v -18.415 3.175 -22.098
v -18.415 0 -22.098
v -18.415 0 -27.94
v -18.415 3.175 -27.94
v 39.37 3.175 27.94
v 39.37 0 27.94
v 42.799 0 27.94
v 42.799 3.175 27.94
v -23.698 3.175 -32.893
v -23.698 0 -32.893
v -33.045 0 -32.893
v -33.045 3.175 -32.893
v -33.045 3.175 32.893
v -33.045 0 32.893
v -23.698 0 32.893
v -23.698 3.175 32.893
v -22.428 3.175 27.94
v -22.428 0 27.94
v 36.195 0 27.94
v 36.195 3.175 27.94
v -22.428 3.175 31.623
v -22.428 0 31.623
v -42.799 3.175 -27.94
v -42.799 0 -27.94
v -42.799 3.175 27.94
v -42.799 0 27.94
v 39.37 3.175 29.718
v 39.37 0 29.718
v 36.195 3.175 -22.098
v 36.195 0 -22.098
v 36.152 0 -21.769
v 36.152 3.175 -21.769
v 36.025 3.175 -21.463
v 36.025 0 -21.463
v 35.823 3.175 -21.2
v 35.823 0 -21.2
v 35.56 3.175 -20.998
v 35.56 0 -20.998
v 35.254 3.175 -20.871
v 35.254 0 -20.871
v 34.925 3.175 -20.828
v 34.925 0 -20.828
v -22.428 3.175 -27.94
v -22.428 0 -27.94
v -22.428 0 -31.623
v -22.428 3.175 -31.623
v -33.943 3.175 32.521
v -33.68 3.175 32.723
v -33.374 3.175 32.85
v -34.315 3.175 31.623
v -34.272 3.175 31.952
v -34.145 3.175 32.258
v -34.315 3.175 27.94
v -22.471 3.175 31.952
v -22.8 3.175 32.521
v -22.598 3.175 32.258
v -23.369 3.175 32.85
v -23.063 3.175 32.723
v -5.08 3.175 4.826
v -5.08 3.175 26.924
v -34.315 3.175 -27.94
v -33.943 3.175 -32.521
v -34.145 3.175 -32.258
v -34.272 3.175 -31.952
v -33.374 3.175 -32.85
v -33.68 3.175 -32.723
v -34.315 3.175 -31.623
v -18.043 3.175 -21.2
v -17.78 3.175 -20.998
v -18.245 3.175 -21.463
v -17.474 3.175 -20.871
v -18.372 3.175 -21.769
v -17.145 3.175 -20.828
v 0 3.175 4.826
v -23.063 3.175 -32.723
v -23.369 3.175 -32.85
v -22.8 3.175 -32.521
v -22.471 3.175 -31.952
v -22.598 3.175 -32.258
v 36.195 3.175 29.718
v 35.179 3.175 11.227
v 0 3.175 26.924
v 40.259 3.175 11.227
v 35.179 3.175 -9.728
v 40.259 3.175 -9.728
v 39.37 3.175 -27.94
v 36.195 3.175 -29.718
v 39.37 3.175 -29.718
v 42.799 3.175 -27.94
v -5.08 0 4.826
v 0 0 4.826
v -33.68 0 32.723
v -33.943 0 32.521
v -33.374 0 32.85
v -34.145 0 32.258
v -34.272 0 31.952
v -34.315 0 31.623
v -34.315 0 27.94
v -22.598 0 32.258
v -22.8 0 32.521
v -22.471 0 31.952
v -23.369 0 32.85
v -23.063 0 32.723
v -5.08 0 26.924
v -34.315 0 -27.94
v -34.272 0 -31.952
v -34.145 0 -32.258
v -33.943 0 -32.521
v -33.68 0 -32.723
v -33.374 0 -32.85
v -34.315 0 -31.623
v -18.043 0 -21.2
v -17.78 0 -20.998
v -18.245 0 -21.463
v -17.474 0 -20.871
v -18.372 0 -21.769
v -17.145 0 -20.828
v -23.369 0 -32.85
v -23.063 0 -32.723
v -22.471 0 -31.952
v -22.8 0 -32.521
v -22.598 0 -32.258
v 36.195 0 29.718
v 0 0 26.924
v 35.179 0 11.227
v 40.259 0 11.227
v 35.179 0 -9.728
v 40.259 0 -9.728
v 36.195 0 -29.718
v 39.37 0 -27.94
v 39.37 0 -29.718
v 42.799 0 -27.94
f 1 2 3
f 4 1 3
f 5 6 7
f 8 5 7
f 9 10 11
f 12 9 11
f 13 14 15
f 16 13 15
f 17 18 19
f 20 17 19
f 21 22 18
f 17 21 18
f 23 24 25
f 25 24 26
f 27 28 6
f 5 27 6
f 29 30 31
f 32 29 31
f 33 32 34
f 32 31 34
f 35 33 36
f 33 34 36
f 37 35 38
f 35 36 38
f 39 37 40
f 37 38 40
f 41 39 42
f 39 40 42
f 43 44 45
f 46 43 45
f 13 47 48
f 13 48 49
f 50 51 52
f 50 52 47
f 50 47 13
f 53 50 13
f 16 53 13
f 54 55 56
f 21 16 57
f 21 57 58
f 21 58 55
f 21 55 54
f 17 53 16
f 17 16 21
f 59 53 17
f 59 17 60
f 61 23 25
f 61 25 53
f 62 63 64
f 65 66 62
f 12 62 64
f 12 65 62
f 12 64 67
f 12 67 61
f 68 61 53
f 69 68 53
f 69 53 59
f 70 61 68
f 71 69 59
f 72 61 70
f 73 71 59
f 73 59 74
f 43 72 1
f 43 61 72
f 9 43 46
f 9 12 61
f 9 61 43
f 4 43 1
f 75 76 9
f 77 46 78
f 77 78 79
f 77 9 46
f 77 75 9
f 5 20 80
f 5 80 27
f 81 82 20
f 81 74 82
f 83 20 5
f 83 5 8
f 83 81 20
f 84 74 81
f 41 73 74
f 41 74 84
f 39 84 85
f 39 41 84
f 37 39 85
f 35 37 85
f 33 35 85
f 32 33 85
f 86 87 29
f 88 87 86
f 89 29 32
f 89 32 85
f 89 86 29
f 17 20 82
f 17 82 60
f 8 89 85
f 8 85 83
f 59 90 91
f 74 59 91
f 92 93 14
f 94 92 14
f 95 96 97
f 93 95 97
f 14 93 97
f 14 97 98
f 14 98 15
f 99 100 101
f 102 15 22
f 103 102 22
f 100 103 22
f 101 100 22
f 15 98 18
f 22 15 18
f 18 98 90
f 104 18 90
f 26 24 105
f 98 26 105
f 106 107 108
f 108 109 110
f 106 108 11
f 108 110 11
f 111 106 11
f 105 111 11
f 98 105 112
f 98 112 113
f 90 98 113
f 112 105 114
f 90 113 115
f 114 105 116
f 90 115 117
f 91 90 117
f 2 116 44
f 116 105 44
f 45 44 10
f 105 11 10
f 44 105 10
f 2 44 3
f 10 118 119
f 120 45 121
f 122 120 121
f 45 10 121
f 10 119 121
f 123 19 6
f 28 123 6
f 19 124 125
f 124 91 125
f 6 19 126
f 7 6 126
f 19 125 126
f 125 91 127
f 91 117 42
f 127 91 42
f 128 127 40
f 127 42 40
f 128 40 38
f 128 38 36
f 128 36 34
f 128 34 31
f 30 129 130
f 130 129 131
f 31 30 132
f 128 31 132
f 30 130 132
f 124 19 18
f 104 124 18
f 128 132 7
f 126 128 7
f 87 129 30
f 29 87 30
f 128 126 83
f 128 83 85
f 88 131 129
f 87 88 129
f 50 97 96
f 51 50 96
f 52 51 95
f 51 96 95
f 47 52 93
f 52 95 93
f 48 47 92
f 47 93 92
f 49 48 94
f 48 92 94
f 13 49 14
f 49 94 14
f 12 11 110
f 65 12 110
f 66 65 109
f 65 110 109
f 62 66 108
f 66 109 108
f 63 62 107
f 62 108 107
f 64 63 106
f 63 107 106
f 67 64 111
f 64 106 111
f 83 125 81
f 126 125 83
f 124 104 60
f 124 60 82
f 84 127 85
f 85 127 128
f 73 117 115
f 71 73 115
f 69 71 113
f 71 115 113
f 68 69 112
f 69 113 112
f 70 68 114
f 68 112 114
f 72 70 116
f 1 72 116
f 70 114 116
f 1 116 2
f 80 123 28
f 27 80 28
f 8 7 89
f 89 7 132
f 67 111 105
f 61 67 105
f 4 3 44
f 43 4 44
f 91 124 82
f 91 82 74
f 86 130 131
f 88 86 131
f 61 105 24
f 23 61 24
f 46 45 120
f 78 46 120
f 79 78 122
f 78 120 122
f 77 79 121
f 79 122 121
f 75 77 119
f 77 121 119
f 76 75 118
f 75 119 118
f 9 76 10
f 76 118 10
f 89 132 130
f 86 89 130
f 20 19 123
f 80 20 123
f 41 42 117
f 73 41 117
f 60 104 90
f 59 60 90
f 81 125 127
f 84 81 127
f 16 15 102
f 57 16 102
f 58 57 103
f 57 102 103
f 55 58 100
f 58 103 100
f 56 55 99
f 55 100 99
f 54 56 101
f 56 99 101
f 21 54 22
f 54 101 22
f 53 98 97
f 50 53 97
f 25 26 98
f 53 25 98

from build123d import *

# Parameters (mm, degrees)
SKETCH1_W           = 5.08
SKETCH1_H           = 20.955
SKETCH1_H_2         = 22.098
BOSS_EXTRUDE1_DEPTH = 3.175


with BuildPart() as part:
    # Sketch1 → Boss-Extrude1 (new body)
    with BuildSketch(Plane(origin=(0, 0, 0), x_dir=(1, 0, 0), z_dir=(0, 1, 0))):
        with BuildLine():
            Line((36.195, 27.94), (36.195, 22.098))
            ThreePointArc((36.195, 22.098), (35.823025612, 21.199974388), (34.925, 20.828))
            Line((34.925, 20.828), (-17.145, 20.828))
            ThreePointArc((-17.145, 20.828), (-18.043025612, 21.199974388), (-18.415, 22.098))
            Line((-18.415, 22.098), (-18.415, 27.94))
            Line((-18.415, 27.94), (-22.4282, 27.94))
            Line((-22.4282, 27.94), (-22.4282, 31.623))
            ThreePointArc((-22.4282, 31.623), (-22.800174388, 32.521025612), (-23.6982, 32.893))
            Line((-23.6982, 32.893), (-33.0454, 32.893))
            ThreePointArc((-33.0454, 32.893), (-33.943425612, 32.521025612), (-34.3154, 31.623))
            Line((-34.3154, 31.623), (-34.3154, 27.94))
            Line((-34.3154, 27.94), (-42.799, 27.94))
            Line((-42.799, 27.94), (-42.799, -27.94))
            Line((-42.799, -27.94), (-34.3154, -27.94))
            Line((-34.3154, -27.94), (-34.3154, -31.623))
            ThreePointArc((-34.3154, -31.623), (-33.943425612, -32.521025612), (-33.0454, -32.893))
            Line((-33.0454, -32.893), (-23.6982, -32.893))
            ThreePointArc((-23.6982, -32.893), (-22.800174388, -32.521025612), (-22.4282, -31.623))
            Line((-22.4282, -31.623), (-22.4282, -27.94))
            Line((-22.4282, -27.94), (36.195, -27.94))
            Line((36.195, -27.94), (36.195, -29.718))
            Line((36.195, -29.718), (39.37, -29.718))
            Line((39.37, -29.718), (39.37, -27.94))
            Line((39.37, -27.94), (42.799, -27.94))
            Line((42.799, -27.94), (42.799, 27.94))
            Line((42.799, 27.94), (39.37, 27.94))
            Line((39.37, 27.94), (39.37, 29.718))
            Line((39.37, 29.718), (36.195, 29.718))
            Line((36.195, 29.718), (36.195, 27.94))
        make_face()
        with Locations((37.719, -0.7493)):
            Rectangle(SKETCH1_W, SKETCH1_H, mode=Mode.SUBTRACT)
        with Locations((-2.54, -15.875)):
            Rectangle(SKETCH1_W, SKETCH1_H_2, mode=Mode.SUBTRACT)
    extrude(amount=BOSS_EXTRUDE1_DEPTH)


solid = part.part
